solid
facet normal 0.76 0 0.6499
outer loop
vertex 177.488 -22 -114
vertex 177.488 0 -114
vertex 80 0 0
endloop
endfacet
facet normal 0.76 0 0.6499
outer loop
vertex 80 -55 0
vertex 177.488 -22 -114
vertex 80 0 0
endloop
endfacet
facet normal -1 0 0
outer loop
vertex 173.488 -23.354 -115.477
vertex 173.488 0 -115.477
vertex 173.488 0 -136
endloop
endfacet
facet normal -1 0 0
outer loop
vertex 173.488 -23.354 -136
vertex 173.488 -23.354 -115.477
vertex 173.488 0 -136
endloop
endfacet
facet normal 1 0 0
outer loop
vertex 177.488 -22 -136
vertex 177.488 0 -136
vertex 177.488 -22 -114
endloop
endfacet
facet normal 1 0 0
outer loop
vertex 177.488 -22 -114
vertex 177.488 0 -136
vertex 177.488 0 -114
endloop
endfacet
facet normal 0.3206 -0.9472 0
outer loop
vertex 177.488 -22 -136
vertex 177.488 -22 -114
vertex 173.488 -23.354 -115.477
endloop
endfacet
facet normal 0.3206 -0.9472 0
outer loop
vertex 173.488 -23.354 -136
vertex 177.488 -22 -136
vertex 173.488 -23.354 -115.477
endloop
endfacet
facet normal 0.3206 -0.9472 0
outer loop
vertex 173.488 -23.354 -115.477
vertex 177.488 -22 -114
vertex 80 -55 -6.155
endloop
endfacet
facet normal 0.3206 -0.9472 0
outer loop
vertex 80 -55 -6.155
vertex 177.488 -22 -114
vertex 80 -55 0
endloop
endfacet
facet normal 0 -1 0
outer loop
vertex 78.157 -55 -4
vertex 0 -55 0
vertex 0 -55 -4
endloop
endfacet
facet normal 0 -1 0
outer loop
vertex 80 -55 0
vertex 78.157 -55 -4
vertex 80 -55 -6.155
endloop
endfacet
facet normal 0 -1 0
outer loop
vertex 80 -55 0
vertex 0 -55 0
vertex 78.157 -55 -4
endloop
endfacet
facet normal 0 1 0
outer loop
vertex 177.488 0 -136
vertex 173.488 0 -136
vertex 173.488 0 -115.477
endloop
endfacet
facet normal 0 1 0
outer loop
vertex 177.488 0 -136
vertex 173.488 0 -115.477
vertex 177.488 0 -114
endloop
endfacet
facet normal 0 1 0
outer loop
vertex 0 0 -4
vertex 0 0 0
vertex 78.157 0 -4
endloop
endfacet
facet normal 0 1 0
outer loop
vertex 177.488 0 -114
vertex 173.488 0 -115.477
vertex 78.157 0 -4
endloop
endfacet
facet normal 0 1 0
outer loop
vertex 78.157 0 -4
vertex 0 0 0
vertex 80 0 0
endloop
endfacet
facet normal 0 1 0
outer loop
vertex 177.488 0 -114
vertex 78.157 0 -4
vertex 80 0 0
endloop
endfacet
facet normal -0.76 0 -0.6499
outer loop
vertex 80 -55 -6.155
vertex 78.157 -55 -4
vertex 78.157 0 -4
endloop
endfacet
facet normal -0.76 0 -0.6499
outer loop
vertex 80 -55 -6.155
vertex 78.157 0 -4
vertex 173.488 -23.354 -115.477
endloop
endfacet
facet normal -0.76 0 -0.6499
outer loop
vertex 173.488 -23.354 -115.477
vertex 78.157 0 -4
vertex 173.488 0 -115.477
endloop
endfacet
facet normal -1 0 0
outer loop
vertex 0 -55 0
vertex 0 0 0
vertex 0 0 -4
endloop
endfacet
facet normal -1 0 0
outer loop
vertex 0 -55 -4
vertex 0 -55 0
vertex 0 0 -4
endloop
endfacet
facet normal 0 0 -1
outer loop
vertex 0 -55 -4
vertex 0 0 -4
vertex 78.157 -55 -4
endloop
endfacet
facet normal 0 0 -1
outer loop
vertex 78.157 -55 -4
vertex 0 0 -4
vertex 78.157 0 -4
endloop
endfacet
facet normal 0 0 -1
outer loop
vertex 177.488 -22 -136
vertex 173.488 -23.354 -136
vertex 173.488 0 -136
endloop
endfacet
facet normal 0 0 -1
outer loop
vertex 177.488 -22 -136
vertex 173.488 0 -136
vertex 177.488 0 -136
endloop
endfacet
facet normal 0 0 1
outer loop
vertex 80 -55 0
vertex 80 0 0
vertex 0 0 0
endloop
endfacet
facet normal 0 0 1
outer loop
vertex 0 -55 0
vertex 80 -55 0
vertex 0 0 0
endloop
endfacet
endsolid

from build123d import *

# Parameters (mm, degrees)
F1_DEPTH = 55
F3_DEPTH = 150


with BuildPart() as f1:
    # F0 (on Front) → F1 (new body)
    with BuildSketch(Plane.XZ):
        Polygon((80, 0), (0, 0), (0, -4), (78.15749, -4), (173.488461, -115.477098), (173.488461, -136), (177.488461, -136), (177.488461, -114), align=None)
    extrude(amount=F1_DEPTH)

    # F2 (on Top) → F3 (cut)
    with BuildSketch(Plane.XY):
        Polygon((177.488461, -22), (80, -55), (177.488461, -55), align=None)
    extrude(amount=-F3_DEPTH, mode=Mode.SUBTRACT)


solid = f1.part
